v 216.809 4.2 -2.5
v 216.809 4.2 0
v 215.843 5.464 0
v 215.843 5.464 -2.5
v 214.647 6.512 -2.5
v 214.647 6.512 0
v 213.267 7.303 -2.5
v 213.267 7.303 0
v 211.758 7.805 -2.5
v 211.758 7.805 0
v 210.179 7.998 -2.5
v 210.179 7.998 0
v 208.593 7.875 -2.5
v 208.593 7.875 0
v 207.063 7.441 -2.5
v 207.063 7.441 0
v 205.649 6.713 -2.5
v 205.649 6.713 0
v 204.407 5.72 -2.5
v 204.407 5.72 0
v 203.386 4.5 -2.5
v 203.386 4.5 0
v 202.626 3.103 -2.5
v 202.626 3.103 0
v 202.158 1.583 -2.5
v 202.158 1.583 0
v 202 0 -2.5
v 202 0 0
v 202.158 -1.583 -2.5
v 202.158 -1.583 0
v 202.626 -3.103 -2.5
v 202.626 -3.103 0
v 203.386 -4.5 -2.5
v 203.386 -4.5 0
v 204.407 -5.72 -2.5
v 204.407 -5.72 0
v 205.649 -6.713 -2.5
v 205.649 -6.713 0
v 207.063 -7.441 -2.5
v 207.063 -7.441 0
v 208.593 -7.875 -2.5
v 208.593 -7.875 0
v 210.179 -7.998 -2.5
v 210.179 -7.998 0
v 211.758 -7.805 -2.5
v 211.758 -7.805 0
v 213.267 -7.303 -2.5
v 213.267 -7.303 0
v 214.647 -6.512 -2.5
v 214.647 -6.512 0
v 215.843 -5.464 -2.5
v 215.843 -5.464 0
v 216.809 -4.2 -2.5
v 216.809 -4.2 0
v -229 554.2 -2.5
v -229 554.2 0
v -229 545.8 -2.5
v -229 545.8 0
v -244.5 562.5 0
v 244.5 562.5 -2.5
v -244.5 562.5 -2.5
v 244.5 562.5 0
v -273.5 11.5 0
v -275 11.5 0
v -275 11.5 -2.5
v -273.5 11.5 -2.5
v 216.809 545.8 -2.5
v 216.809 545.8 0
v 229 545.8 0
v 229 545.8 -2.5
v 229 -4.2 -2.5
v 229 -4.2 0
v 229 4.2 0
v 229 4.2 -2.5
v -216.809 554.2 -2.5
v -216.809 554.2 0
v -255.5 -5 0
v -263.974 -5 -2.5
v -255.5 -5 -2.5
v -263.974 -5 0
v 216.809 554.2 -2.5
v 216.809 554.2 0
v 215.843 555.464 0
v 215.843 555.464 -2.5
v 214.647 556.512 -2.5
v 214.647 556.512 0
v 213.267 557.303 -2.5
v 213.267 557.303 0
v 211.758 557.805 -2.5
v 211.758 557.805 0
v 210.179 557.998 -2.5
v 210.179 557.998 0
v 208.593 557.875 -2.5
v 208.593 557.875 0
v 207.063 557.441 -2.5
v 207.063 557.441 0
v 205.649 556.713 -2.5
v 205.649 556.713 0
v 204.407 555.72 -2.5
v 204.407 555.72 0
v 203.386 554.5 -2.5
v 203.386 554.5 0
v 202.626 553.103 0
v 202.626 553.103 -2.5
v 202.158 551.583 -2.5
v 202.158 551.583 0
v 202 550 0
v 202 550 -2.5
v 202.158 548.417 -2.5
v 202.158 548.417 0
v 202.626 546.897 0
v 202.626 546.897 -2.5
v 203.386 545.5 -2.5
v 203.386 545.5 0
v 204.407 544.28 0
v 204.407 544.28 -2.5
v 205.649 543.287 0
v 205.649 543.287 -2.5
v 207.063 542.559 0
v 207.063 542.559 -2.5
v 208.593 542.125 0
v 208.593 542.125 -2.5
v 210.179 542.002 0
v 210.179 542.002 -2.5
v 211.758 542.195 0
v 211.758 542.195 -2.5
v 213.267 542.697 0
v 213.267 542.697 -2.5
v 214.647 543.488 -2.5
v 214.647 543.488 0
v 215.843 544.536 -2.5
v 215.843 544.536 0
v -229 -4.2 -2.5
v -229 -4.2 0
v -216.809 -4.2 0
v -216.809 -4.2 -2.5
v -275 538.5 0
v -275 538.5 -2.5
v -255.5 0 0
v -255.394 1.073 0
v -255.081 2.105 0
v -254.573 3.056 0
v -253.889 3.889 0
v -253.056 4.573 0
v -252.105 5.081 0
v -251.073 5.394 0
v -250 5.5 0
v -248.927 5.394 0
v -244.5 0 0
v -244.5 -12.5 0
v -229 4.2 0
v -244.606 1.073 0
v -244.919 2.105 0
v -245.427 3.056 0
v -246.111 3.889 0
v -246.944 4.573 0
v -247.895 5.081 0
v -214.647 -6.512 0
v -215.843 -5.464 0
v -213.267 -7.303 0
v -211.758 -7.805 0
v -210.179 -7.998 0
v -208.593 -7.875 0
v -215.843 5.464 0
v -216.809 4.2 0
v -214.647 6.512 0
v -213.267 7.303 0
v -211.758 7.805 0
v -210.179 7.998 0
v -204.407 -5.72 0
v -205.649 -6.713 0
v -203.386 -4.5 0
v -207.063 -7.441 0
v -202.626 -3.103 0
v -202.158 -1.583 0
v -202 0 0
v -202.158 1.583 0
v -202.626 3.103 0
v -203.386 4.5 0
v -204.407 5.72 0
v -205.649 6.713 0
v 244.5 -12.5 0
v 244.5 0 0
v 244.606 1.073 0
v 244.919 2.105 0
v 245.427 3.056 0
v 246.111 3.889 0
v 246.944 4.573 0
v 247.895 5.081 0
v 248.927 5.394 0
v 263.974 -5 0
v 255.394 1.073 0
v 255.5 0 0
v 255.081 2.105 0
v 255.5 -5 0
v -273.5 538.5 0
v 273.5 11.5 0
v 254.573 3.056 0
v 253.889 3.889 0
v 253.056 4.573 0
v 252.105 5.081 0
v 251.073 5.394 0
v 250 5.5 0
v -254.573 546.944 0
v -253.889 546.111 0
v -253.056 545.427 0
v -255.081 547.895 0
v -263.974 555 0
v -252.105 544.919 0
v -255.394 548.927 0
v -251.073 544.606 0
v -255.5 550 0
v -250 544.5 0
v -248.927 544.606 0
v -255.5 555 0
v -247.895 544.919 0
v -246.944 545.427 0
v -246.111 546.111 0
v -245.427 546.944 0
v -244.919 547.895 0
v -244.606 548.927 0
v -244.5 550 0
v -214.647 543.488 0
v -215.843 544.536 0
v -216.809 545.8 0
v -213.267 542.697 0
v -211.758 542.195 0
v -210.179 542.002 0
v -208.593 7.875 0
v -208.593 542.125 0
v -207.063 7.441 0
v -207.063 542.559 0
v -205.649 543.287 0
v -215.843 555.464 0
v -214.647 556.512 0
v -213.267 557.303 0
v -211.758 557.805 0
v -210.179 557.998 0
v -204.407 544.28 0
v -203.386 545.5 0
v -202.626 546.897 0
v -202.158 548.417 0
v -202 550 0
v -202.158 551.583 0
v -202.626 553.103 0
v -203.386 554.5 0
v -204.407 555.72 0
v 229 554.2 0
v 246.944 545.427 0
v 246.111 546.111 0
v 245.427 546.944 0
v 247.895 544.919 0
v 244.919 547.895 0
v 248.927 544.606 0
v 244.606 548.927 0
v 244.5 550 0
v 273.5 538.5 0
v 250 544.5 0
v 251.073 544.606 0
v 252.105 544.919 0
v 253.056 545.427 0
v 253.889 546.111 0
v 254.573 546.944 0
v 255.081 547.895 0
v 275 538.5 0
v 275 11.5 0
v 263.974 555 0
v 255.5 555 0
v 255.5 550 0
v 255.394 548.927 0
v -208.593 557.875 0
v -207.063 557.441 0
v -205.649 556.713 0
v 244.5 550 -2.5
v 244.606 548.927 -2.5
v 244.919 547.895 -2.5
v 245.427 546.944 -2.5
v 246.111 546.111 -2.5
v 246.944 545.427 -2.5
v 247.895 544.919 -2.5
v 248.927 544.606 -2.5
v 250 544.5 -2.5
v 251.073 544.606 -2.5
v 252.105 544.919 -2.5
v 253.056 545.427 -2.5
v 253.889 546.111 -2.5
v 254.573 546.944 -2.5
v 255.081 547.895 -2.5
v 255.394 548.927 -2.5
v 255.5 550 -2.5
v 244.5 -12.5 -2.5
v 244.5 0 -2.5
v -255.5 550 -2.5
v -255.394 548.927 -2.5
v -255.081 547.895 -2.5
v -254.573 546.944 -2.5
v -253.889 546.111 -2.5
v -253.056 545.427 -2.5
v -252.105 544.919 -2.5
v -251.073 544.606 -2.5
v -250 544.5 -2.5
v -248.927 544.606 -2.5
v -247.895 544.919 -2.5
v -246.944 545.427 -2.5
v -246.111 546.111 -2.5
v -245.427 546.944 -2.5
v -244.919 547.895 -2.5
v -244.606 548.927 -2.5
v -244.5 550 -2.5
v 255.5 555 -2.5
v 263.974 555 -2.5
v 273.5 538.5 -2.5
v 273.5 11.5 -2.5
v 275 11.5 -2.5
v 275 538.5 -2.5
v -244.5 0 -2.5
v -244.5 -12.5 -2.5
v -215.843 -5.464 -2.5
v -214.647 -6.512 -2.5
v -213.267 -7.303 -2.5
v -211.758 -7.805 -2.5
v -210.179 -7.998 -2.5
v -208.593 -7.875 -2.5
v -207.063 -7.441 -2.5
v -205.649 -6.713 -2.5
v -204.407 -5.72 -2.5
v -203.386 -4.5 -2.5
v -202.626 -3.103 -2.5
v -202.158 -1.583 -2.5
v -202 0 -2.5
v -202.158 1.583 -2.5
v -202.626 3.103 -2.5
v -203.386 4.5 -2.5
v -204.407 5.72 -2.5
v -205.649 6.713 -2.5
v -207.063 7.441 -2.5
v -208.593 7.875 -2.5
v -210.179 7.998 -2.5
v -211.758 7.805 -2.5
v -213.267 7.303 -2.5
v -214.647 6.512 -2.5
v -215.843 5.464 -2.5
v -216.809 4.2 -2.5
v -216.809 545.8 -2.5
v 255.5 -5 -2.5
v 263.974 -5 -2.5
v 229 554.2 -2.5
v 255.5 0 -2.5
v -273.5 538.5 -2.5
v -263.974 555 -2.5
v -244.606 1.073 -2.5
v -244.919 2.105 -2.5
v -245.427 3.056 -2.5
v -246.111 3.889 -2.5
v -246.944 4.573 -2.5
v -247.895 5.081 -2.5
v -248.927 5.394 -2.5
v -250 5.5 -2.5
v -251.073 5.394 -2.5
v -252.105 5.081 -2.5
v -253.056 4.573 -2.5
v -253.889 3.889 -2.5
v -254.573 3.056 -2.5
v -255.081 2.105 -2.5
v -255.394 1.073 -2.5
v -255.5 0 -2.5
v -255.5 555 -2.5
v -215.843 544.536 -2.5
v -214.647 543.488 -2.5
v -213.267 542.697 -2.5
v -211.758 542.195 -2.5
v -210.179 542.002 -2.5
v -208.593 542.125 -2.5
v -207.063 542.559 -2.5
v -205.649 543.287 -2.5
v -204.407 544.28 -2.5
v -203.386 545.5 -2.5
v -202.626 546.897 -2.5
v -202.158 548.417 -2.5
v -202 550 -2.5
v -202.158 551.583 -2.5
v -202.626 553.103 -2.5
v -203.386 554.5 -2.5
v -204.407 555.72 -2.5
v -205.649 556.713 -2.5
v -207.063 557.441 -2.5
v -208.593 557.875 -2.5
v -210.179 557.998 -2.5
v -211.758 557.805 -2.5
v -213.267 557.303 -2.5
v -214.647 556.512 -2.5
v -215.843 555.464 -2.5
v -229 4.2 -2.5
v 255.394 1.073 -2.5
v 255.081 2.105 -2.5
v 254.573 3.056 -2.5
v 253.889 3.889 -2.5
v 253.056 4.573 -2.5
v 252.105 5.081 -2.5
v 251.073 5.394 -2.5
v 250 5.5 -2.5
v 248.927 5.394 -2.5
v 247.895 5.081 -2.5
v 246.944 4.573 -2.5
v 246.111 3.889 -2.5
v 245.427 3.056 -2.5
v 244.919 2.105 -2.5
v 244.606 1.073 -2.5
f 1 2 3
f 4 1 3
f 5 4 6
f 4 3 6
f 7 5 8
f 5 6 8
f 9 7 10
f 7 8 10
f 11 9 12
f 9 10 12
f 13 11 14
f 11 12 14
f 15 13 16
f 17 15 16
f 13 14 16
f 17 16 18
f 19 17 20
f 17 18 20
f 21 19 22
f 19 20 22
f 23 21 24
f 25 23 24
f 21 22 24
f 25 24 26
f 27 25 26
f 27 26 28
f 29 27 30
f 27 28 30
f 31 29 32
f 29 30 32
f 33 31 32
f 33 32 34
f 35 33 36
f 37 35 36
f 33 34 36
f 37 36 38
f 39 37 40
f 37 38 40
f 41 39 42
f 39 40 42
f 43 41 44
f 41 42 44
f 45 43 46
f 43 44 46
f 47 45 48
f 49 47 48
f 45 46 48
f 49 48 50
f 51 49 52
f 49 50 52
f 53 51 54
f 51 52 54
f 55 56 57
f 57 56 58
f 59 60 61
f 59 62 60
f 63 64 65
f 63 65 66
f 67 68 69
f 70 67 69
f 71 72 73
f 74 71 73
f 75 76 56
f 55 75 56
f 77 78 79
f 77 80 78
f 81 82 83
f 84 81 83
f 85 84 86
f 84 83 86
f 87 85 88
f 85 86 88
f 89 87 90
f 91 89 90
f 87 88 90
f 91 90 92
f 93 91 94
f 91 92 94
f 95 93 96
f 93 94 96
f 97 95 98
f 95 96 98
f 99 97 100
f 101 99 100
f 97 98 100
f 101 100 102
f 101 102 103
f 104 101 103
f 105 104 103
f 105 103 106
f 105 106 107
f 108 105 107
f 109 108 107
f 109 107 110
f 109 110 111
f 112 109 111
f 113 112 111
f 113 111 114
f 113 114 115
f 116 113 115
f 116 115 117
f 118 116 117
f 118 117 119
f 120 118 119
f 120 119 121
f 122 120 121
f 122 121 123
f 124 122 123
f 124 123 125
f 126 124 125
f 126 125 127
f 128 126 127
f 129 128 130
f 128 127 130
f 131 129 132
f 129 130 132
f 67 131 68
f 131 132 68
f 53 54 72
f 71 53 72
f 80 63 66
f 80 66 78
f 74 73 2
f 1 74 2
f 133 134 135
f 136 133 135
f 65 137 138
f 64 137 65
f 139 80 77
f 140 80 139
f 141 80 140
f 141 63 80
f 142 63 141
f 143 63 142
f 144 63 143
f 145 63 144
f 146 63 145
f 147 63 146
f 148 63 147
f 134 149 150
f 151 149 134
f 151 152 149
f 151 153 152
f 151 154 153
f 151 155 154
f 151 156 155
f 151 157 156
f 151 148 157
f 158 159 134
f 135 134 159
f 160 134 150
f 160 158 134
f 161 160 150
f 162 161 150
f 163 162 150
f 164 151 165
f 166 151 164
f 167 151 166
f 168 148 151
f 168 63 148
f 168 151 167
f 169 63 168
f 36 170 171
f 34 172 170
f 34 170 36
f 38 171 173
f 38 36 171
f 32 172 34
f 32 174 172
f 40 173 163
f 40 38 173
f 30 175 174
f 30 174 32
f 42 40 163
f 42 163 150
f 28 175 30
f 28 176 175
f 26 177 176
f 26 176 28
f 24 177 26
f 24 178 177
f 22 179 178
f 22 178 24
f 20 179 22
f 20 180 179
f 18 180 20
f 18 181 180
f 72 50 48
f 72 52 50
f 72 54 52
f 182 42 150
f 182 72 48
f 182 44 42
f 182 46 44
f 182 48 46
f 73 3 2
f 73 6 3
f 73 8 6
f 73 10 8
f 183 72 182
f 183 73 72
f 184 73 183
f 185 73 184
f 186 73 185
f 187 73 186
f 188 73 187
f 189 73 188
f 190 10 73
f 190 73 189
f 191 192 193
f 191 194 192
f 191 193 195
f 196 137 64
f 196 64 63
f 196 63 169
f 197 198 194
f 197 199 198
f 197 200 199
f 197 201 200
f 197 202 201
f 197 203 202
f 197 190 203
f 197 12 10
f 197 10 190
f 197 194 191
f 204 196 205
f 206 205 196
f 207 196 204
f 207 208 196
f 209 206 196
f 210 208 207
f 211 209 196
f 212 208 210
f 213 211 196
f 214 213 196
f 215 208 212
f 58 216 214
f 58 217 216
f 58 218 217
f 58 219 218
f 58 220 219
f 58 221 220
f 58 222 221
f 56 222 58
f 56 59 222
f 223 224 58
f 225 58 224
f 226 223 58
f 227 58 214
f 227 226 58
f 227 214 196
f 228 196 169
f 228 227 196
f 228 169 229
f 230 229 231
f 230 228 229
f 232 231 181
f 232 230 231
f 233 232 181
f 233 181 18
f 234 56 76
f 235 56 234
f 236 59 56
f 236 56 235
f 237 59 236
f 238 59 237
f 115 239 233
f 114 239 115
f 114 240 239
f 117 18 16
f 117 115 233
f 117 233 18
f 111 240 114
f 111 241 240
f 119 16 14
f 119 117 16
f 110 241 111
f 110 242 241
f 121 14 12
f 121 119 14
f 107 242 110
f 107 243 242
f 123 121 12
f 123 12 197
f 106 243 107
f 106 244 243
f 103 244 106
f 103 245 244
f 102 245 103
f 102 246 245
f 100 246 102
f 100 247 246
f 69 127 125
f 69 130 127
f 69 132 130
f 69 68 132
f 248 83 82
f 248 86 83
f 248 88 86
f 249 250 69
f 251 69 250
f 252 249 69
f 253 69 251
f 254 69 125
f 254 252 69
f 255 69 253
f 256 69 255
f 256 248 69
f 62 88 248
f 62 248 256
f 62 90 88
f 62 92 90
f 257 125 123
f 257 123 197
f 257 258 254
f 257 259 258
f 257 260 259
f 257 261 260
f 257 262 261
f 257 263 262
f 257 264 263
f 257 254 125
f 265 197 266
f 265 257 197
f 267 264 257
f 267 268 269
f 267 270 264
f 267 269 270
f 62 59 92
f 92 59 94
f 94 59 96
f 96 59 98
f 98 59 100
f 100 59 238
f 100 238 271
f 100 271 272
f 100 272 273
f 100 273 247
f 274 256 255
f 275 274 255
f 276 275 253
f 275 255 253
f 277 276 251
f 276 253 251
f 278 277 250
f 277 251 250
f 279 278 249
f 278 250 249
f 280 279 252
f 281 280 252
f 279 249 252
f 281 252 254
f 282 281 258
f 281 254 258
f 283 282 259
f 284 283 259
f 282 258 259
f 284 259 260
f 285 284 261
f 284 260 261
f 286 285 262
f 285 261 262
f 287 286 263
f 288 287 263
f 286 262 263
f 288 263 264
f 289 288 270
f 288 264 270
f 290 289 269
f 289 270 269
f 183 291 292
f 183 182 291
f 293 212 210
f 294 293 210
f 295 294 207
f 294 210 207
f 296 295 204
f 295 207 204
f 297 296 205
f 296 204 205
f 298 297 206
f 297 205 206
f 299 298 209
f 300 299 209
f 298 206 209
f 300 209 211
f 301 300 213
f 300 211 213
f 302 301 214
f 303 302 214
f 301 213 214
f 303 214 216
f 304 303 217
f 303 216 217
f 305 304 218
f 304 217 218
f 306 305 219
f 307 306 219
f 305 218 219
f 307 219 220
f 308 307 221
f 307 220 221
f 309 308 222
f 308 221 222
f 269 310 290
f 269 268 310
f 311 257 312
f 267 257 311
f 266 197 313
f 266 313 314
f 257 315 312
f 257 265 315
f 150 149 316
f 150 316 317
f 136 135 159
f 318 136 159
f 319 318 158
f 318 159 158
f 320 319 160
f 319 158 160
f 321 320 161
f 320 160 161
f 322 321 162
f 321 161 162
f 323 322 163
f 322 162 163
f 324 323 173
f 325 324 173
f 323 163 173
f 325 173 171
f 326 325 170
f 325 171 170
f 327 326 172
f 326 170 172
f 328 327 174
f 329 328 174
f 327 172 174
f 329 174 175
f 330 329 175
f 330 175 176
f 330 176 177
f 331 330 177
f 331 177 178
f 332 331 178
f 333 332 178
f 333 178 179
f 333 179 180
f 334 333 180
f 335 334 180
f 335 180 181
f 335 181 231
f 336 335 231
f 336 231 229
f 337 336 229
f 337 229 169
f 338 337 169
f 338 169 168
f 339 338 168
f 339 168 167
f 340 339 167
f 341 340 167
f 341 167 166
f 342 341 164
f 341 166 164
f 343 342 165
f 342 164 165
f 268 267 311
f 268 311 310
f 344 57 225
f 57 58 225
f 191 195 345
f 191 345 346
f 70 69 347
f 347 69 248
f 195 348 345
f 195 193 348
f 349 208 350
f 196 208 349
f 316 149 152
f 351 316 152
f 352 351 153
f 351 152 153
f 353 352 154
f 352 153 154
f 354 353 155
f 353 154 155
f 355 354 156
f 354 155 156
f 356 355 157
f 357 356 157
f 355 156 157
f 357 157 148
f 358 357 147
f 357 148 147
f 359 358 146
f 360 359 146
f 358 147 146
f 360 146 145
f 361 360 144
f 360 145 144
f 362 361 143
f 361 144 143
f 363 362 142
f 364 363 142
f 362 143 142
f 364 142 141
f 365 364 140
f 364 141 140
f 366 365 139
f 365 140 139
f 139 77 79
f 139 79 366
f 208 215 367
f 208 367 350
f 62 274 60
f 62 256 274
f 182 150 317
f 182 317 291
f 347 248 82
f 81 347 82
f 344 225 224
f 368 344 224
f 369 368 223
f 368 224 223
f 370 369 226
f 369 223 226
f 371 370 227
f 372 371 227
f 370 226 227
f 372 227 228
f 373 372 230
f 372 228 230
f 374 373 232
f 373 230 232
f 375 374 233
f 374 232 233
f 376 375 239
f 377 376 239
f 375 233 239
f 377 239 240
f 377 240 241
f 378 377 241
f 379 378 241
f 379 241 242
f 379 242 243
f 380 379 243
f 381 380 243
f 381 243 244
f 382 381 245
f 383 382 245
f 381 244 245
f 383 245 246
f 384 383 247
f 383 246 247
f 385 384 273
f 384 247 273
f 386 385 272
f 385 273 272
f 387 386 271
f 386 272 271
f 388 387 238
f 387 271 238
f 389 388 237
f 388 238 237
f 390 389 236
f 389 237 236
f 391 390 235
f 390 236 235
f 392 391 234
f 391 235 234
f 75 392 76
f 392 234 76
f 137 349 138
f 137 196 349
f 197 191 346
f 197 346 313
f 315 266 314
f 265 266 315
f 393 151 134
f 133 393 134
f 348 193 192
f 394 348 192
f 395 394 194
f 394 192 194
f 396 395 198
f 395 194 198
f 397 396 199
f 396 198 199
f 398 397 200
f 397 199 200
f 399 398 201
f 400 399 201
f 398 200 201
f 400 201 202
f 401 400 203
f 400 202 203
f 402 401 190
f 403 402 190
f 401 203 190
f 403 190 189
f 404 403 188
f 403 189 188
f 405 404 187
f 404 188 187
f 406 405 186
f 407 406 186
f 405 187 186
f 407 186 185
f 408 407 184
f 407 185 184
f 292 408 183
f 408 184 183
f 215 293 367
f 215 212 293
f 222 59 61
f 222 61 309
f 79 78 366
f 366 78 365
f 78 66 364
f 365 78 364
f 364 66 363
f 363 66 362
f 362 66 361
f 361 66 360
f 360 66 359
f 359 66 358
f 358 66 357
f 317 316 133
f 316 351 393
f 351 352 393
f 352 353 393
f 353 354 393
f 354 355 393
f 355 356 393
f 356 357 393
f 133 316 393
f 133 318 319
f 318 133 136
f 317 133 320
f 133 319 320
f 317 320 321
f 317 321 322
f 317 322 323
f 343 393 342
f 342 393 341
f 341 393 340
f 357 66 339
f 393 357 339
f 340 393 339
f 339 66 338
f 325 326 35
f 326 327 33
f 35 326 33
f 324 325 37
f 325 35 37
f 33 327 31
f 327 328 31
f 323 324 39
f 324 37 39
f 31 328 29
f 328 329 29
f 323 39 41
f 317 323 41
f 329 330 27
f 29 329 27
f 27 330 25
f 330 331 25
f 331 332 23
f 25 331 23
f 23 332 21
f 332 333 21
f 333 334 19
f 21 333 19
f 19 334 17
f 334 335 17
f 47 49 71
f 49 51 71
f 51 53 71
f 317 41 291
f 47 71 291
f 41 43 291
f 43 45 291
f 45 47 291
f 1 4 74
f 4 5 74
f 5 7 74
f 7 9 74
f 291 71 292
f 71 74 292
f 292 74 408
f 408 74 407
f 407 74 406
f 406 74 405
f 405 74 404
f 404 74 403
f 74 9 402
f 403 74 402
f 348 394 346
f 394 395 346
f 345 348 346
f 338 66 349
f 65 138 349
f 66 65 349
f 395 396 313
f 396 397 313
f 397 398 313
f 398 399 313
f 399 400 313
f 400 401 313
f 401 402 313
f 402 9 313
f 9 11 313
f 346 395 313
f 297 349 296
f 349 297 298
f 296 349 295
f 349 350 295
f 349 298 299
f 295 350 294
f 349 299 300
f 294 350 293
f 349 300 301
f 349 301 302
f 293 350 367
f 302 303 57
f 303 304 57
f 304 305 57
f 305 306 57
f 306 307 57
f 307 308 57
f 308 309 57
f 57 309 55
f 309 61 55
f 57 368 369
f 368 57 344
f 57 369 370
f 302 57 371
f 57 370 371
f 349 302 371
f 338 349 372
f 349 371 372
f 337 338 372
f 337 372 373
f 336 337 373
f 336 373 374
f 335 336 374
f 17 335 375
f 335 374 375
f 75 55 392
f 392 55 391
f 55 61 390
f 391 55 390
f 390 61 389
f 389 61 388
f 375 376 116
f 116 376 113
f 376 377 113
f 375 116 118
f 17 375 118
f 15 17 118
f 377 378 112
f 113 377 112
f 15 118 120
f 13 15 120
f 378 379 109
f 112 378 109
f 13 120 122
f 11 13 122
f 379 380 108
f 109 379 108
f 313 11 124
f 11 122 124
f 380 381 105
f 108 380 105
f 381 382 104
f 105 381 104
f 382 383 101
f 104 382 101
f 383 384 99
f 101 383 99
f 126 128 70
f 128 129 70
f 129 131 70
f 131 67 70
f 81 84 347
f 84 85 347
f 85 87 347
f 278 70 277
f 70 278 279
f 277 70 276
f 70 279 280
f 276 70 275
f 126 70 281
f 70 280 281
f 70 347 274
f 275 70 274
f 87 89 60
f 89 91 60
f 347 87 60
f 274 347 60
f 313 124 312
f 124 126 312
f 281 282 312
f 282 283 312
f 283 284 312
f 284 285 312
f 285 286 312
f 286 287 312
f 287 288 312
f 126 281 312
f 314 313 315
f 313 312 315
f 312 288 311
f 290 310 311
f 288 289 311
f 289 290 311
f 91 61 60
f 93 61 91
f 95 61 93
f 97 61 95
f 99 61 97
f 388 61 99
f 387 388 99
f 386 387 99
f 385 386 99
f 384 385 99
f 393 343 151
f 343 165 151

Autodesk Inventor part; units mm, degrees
sketch "Sketch_12" plane through (0, 0, 0) normal (0, 0, 1) x (1, 0, 0)
  line L0 (-275, 538.5) -> (-275, 11.5)
  line L1 (-275, 11.5) -> (-273.5, 11.5)
  line L2 (-273.5, 11.5) -> (-263.9737, -5)
  line L3 (-263.9737, -5) -> (-255.5, -5)
  line L4 (-255.5, -5) -> (-255.5, 0)
  arc A0 (-244.5, 0) -> (-255.5, 0) centre (-250, 0) ccw
  line L5 (-244.5, 0) -> (-244.5, -12.5)
  line L6 (-244.5, -12.5) -> (244.5, -12.5)
  line L7 (244.5, -12.5) -> (244.5, 0)
  arc A1 (255.5, 0) -> (244.5, 0) centre (250, 0) ccw
  line L8 (255.5, 0) -> (255.5, -5)
  line L9 (255.5, -5) -> (263.9737, -5)
  line L10 (263.9737, -5) -> (273.5, 11.5)
  line L11 (273.5, 11.5) -> (275, 11.5)
  line L12 (275, 11.5) -> (275, 538.5)
  line L13 (275, 538.5) -> (273.5, 538.5)
  line L14 (273.5, 538.5) -> (263.9737, 555)
  line L15 (263.9737, 555) -> (255.5, 555)
  line L16 (255.5, 555) -> (255.5, 550)
  arc A2 (244.5, 550) -> (255.5, 550) centre (250, 550) ccw
  line L17 (244.5, 550) -> (244.5, 562.5)
  line L18 (244.5, 562.5) -> (-244.5, 562.5)
  line L19 (-244.5, 562.5) -> (-244.5, 550)
  arc A3 (-255.5, 550) -> (-244.5, 550) centre (-250, 550) ccw
  line L20 (-255.5, 550) -> (-255.5, 555)
  line L21 (-255.5, 555) -> (-263.9737, 555)
  line L22 (-263.9737, 555) -> (-273.5, 538.5)
  line L23 (-273.5, 538.5) -> (-275, 538.5)
  arc A4 (216.8088, 4.2) -> (216.8088, -4.2) centre (210, 0) ccw
  line L24 (216.8088, -4.2) -> (229, -4.2)
  line L25 (229, -4.2) -> (229, 4.2)
  line L26 (229, 4.2) -> (216.8088, 4.2)
  arc A5 (216.8088, 554.2) -> (216.8088, 545.8) centre (210, 550) ccw
  line L27 (216.8088, 545.8) -> (229, 545.8)
  line L28 (229, 545.8) -> (229, 554.2)
  line L29 (229, 554.2) -> (216.8088, 554.2)
  line L30 (-229, 4.2) -> (-229, -4.2)
  line L31 (-229, -4.2) -> (-216.8088, -4.2)
  arc A6 (-216.8088, -4.2) -> (-216.8088, 4.2) centre (-210, 0) ccw
  line L32 (-216.8088, 4.2) -> (-229, 4.2)
  line L33 (-229, 554.2) -> (-229, 545.8)
  line L34 (-229, 545.8) -> (-216.8088, 545.8)
  arc A7 (-216.8088, 545.8) -> (-216.8088, 554.2) centre (-210, 550) ccw
  line L35 (-216.8088, 554.2) -> (-229, 554.2)
extrude "Extrusion1" add sketch "Sketch_12" against normal blind 2.5
ref_plane "MP_XY" through (0, 0, 0) normal (0, 0, 1) x (1, 0, 0)
ref_plane "MP_YZ" through (0, 0, 0) normal (1, 0, 0) x (0, 1, 0)
ref_plane "MP_ZX" through (0, 0, 0) normal (0, 1, 0) x (0, 0, 1)
ref_plane "to_EB_XY" through (224.8, 0, -2.5) normal (0, 0, 1) x (1, 0, 0)
ref_plane "to_EB_YZ" through (224.8, 0, -2.5) normal (1, 0, 0) x (0, 1, 0)
ref_plane "to_EB_ZX" through (224.8, 0, -2.5) normal (0, 1, 0) x (0, 0, 1)
properties part number "166X_02_00_P6_(2)"
